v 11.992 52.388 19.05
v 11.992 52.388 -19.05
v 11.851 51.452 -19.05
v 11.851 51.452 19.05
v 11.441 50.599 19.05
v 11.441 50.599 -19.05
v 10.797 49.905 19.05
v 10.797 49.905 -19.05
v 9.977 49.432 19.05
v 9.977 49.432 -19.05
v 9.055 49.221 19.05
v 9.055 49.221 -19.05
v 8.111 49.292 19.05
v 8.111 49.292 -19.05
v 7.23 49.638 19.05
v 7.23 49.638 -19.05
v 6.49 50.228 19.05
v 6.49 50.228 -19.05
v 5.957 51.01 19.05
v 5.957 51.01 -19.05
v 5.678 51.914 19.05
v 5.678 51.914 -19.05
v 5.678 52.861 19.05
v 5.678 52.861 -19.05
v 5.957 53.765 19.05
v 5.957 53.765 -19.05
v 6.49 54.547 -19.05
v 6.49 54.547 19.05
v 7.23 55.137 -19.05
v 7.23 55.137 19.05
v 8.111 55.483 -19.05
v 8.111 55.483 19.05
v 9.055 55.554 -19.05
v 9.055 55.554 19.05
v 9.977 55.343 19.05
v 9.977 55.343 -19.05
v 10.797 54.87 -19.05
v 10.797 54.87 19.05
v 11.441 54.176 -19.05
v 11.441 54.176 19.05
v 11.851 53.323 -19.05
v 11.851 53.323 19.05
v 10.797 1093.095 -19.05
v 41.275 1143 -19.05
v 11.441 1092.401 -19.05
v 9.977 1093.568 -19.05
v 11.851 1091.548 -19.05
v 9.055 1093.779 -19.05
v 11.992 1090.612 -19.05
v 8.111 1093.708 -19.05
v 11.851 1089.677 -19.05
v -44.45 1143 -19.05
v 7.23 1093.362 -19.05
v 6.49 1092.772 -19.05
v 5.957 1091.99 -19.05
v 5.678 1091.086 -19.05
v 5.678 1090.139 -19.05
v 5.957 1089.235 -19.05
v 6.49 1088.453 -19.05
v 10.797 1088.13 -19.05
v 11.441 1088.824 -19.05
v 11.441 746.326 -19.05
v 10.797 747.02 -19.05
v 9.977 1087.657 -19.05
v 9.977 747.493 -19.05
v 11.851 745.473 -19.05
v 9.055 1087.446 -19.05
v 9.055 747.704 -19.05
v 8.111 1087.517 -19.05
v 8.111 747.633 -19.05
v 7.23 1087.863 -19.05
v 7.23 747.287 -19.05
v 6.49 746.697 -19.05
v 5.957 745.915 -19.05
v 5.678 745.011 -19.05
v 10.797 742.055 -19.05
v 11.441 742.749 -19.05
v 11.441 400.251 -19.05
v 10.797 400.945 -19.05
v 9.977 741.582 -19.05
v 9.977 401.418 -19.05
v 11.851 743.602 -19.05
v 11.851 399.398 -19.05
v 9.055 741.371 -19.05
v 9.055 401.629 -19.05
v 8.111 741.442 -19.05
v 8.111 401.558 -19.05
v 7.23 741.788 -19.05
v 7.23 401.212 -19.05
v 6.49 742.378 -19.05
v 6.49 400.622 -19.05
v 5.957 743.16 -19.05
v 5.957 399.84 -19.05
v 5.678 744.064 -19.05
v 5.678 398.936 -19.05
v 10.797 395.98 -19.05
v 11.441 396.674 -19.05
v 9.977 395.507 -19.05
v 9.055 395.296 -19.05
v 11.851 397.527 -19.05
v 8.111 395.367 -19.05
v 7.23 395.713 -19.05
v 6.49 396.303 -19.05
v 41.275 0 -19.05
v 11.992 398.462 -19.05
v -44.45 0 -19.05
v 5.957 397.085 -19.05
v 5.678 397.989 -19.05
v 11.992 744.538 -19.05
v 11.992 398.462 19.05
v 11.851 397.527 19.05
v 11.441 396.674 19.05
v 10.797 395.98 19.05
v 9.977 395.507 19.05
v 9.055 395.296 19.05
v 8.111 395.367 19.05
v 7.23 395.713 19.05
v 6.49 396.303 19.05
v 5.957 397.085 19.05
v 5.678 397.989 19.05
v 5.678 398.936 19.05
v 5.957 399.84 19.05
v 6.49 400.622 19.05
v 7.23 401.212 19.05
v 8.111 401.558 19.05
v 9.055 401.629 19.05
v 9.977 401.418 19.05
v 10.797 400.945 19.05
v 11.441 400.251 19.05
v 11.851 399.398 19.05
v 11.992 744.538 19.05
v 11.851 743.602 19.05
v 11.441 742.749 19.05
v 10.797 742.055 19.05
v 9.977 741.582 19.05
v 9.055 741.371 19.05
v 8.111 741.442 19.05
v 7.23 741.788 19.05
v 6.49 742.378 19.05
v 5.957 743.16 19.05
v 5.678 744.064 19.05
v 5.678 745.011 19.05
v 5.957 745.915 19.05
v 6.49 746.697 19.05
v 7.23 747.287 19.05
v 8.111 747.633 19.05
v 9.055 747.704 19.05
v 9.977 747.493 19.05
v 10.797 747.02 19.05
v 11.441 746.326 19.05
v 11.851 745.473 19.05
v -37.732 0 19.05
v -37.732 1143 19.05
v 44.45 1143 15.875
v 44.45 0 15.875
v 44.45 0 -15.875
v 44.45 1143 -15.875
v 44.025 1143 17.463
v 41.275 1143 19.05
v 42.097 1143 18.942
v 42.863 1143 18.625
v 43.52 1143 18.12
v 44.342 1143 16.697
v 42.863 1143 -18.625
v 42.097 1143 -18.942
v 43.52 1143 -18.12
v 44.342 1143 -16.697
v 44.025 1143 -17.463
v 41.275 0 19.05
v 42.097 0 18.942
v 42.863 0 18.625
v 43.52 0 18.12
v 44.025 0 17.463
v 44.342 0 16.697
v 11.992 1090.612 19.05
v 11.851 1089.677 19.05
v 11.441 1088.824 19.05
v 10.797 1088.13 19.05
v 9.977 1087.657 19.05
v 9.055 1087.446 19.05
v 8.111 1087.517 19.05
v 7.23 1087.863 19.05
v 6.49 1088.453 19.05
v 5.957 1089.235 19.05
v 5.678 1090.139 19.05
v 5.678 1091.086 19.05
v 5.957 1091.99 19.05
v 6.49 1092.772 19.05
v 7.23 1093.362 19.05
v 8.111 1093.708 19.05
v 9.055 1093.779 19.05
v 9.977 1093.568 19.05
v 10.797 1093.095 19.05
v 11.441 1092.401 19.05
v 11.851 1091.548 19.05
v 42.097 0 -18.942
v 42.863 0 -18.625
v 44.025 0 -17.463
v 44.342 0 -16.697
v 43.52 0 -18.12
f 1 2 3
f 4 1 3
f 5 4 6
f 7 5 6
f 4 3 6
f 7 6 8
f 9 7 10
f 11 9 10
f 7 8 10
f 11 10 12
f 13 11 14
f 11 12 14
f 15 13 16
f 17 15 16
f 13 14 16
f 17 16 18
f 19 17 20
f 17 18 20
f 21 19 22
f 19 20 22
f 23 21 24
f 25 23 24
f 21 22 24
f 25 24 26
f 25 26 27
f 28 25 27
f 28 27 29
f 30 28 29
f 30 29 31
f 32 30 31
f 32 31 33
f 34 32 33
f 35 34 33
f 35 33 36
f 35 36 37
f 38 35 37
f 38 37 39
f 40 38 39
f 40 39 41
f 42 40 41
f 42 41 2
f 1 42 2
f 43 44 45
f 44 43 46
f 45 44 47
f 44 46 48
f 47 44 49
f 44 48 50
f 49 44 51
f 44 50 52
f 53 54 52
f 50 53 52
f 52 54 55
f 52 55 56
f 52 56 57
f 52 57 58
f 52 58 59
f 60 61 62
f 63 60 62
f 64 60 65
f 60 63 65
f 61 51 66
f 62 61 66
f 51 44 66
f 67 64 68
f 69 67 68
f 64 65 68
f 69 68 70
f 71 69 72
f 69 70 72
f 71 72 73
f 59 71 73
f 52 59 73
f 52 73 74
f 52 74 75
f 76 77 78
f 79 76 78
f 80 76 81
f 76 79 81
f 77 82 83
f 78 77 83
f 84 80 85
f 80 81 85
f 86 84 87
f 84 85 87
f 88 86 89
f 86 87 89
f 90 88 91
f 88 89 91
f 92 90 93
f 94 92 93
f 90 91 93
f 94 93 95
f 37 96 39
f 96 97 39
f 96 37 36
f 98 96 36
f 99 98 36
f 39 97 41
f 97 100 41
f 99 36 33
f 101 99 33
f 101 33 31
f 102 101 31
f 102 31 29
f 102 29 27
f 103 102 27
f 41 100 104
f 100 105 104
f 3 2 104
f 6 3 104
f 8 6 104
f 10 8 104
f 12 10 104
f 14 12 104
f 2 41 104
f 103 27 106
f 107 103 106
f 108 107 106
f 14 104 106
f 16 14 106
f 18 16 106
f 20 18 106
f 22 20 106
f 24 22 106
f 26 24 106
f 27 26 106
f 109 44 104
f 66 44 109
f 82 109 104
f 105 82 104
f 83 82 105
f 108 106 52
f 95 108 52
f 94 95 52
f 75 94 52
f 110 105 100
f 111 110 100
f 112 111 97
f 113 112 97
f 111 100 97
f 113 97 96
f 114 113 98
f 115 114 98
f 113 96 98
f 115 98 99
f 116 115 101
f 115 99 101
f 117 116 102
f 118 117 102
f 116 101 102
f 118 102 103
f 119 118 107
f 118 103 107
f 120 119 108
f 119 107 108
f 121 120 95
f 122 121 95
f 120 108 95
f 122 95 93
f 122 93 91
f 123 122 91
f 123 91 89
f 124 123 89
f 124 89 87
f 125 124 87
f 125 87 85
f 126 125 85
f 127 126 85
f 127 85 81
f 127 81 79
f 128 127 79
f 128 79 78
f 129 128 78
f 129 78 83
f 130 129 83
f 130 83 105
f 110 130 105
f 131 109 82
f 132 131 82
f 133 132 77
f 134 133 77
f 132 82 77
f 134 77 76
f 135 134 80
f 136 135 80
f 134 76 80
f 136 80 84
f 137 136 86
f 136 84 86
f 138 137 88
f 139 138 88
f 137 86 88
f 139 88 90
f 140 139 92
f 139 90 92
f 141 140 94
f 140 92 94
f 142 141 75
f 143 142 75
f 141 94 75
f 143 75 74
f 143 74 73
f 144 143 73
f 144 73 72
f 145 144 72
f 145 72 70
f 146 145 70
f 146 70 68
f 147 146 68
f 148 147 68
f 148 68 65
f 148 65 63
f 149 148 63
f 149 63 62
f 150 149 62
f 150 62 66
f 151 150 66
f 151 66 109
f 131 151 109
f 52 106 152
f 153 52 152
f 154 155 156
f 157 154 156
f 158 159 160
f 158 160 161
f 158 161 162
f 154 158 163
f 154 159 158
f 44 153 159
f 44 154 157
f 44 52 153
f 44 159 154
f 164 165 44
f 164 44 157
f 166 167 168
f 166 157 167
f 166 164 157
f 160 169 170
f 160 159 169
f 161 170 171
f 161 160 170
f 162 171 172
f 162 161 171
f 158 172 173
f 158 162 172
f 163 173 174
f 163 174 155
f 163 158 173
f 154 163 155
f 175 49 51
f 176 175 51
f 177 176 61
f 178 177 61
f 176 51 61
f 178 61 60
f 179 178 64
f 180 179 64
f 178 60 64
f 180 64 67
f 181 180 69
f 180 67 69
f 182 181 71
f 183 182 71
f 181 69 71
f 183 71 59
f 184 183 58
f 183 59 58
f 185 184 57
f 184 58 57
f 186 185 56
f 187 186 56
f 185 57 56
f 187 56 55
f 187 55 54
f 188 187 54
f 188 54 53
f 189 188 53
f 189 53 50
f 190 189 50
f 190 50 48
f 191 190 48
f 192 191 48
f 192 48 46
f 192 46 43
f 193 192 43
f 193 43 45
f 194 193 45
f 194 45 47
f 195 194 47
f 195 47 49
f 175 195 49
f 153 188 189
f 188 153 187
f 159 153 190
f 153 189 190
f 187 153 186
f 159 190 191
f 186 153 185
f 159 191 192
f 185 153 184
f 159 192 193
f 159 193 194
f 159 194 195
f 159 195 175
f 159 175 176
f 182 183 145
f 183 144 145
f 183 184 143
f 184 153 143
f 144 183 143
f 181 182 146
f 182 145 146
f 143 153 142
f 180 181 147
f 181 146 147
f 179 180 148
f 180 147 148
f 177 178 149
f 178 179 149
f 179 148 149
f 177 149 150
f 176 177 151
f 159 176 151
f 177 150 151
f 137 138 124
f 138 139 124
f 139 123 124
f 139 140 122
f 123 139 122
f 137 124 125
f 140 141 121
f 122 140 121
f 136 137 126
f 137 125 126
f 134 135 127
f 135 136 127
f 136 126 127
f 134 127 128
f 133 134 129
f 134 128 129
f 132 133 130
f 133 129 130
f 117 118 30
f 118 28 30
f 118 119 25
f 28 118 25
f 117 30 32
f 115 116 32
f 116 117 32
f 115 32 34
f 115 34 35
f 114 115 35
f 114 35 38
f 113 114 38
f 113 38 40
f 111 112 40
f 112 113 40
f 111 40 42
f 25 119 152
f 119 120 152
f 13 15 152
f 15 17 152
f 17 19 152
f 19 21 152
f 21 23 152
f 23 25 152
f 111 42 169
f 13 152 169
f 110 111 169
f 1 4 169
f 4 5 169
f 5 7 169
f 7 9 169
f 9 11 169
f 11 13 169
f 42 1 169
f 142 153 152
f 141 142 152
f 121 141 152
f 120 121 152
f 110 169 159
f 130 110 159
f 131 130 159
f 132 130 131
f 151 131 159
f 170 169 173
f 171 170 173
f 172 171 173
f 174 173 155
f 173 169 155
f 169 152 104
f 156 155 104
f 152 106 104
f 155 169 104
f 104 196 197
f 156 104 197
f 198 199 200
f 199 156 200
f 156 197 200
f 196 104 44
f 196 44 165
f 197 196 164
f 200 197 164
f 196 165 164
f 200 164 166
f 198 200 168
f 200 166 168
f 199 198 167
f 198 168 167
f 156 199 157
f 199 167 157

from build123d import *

# Parameters (mm, degrees)
BOSS_EXTRUDE1_DEPTH         = 1143
F_1_4_0_25_DIAMETER_HOLE1_D = 6.35
FILLET2_R                   = 3.175


with BuildPart() as part:
    # Sketch1 → Boss-Extrude1 (new body)
    with BuildSketch(Plane(origin=(0, 0, 0), x_dir=(1, 0, 0), z_dir=(0, 1, 0))):
        Polygon((-44.45, 19.05), (-37.731942035, -19.05), (44.45, -19.05), (44.45, 19.05), align=None)
    extrude(amount=BOSS_EXTRUDE1_DEPTH)

    # 1/4 (0.25) Diameter Hole1 (through all)
    with Locations(Plane(origin=(0, 0, 19.05), x_dir=(-1, 0, 0), z_dir=(0, 0, 1))):
        with Locations((-8.817444165, -52.3875), (-8.817444165, -398.4625), (-8.817444165, -744.5375), (-8.817444165, -1090.6125)):
            Hole(F_1_4_0_25_DIAMETER_HOLE1_D / 2)

    # Fillet2
    fillet2_edges = [part.edges().sort_by_distance(p)[0] for p in [
        (44.45, 571.5, -19.05),
        (44.45, 571.5, 19.05),
    ]]
    fillet(fillet2_edges, radius=FILLET2_R)


solid = part.part
